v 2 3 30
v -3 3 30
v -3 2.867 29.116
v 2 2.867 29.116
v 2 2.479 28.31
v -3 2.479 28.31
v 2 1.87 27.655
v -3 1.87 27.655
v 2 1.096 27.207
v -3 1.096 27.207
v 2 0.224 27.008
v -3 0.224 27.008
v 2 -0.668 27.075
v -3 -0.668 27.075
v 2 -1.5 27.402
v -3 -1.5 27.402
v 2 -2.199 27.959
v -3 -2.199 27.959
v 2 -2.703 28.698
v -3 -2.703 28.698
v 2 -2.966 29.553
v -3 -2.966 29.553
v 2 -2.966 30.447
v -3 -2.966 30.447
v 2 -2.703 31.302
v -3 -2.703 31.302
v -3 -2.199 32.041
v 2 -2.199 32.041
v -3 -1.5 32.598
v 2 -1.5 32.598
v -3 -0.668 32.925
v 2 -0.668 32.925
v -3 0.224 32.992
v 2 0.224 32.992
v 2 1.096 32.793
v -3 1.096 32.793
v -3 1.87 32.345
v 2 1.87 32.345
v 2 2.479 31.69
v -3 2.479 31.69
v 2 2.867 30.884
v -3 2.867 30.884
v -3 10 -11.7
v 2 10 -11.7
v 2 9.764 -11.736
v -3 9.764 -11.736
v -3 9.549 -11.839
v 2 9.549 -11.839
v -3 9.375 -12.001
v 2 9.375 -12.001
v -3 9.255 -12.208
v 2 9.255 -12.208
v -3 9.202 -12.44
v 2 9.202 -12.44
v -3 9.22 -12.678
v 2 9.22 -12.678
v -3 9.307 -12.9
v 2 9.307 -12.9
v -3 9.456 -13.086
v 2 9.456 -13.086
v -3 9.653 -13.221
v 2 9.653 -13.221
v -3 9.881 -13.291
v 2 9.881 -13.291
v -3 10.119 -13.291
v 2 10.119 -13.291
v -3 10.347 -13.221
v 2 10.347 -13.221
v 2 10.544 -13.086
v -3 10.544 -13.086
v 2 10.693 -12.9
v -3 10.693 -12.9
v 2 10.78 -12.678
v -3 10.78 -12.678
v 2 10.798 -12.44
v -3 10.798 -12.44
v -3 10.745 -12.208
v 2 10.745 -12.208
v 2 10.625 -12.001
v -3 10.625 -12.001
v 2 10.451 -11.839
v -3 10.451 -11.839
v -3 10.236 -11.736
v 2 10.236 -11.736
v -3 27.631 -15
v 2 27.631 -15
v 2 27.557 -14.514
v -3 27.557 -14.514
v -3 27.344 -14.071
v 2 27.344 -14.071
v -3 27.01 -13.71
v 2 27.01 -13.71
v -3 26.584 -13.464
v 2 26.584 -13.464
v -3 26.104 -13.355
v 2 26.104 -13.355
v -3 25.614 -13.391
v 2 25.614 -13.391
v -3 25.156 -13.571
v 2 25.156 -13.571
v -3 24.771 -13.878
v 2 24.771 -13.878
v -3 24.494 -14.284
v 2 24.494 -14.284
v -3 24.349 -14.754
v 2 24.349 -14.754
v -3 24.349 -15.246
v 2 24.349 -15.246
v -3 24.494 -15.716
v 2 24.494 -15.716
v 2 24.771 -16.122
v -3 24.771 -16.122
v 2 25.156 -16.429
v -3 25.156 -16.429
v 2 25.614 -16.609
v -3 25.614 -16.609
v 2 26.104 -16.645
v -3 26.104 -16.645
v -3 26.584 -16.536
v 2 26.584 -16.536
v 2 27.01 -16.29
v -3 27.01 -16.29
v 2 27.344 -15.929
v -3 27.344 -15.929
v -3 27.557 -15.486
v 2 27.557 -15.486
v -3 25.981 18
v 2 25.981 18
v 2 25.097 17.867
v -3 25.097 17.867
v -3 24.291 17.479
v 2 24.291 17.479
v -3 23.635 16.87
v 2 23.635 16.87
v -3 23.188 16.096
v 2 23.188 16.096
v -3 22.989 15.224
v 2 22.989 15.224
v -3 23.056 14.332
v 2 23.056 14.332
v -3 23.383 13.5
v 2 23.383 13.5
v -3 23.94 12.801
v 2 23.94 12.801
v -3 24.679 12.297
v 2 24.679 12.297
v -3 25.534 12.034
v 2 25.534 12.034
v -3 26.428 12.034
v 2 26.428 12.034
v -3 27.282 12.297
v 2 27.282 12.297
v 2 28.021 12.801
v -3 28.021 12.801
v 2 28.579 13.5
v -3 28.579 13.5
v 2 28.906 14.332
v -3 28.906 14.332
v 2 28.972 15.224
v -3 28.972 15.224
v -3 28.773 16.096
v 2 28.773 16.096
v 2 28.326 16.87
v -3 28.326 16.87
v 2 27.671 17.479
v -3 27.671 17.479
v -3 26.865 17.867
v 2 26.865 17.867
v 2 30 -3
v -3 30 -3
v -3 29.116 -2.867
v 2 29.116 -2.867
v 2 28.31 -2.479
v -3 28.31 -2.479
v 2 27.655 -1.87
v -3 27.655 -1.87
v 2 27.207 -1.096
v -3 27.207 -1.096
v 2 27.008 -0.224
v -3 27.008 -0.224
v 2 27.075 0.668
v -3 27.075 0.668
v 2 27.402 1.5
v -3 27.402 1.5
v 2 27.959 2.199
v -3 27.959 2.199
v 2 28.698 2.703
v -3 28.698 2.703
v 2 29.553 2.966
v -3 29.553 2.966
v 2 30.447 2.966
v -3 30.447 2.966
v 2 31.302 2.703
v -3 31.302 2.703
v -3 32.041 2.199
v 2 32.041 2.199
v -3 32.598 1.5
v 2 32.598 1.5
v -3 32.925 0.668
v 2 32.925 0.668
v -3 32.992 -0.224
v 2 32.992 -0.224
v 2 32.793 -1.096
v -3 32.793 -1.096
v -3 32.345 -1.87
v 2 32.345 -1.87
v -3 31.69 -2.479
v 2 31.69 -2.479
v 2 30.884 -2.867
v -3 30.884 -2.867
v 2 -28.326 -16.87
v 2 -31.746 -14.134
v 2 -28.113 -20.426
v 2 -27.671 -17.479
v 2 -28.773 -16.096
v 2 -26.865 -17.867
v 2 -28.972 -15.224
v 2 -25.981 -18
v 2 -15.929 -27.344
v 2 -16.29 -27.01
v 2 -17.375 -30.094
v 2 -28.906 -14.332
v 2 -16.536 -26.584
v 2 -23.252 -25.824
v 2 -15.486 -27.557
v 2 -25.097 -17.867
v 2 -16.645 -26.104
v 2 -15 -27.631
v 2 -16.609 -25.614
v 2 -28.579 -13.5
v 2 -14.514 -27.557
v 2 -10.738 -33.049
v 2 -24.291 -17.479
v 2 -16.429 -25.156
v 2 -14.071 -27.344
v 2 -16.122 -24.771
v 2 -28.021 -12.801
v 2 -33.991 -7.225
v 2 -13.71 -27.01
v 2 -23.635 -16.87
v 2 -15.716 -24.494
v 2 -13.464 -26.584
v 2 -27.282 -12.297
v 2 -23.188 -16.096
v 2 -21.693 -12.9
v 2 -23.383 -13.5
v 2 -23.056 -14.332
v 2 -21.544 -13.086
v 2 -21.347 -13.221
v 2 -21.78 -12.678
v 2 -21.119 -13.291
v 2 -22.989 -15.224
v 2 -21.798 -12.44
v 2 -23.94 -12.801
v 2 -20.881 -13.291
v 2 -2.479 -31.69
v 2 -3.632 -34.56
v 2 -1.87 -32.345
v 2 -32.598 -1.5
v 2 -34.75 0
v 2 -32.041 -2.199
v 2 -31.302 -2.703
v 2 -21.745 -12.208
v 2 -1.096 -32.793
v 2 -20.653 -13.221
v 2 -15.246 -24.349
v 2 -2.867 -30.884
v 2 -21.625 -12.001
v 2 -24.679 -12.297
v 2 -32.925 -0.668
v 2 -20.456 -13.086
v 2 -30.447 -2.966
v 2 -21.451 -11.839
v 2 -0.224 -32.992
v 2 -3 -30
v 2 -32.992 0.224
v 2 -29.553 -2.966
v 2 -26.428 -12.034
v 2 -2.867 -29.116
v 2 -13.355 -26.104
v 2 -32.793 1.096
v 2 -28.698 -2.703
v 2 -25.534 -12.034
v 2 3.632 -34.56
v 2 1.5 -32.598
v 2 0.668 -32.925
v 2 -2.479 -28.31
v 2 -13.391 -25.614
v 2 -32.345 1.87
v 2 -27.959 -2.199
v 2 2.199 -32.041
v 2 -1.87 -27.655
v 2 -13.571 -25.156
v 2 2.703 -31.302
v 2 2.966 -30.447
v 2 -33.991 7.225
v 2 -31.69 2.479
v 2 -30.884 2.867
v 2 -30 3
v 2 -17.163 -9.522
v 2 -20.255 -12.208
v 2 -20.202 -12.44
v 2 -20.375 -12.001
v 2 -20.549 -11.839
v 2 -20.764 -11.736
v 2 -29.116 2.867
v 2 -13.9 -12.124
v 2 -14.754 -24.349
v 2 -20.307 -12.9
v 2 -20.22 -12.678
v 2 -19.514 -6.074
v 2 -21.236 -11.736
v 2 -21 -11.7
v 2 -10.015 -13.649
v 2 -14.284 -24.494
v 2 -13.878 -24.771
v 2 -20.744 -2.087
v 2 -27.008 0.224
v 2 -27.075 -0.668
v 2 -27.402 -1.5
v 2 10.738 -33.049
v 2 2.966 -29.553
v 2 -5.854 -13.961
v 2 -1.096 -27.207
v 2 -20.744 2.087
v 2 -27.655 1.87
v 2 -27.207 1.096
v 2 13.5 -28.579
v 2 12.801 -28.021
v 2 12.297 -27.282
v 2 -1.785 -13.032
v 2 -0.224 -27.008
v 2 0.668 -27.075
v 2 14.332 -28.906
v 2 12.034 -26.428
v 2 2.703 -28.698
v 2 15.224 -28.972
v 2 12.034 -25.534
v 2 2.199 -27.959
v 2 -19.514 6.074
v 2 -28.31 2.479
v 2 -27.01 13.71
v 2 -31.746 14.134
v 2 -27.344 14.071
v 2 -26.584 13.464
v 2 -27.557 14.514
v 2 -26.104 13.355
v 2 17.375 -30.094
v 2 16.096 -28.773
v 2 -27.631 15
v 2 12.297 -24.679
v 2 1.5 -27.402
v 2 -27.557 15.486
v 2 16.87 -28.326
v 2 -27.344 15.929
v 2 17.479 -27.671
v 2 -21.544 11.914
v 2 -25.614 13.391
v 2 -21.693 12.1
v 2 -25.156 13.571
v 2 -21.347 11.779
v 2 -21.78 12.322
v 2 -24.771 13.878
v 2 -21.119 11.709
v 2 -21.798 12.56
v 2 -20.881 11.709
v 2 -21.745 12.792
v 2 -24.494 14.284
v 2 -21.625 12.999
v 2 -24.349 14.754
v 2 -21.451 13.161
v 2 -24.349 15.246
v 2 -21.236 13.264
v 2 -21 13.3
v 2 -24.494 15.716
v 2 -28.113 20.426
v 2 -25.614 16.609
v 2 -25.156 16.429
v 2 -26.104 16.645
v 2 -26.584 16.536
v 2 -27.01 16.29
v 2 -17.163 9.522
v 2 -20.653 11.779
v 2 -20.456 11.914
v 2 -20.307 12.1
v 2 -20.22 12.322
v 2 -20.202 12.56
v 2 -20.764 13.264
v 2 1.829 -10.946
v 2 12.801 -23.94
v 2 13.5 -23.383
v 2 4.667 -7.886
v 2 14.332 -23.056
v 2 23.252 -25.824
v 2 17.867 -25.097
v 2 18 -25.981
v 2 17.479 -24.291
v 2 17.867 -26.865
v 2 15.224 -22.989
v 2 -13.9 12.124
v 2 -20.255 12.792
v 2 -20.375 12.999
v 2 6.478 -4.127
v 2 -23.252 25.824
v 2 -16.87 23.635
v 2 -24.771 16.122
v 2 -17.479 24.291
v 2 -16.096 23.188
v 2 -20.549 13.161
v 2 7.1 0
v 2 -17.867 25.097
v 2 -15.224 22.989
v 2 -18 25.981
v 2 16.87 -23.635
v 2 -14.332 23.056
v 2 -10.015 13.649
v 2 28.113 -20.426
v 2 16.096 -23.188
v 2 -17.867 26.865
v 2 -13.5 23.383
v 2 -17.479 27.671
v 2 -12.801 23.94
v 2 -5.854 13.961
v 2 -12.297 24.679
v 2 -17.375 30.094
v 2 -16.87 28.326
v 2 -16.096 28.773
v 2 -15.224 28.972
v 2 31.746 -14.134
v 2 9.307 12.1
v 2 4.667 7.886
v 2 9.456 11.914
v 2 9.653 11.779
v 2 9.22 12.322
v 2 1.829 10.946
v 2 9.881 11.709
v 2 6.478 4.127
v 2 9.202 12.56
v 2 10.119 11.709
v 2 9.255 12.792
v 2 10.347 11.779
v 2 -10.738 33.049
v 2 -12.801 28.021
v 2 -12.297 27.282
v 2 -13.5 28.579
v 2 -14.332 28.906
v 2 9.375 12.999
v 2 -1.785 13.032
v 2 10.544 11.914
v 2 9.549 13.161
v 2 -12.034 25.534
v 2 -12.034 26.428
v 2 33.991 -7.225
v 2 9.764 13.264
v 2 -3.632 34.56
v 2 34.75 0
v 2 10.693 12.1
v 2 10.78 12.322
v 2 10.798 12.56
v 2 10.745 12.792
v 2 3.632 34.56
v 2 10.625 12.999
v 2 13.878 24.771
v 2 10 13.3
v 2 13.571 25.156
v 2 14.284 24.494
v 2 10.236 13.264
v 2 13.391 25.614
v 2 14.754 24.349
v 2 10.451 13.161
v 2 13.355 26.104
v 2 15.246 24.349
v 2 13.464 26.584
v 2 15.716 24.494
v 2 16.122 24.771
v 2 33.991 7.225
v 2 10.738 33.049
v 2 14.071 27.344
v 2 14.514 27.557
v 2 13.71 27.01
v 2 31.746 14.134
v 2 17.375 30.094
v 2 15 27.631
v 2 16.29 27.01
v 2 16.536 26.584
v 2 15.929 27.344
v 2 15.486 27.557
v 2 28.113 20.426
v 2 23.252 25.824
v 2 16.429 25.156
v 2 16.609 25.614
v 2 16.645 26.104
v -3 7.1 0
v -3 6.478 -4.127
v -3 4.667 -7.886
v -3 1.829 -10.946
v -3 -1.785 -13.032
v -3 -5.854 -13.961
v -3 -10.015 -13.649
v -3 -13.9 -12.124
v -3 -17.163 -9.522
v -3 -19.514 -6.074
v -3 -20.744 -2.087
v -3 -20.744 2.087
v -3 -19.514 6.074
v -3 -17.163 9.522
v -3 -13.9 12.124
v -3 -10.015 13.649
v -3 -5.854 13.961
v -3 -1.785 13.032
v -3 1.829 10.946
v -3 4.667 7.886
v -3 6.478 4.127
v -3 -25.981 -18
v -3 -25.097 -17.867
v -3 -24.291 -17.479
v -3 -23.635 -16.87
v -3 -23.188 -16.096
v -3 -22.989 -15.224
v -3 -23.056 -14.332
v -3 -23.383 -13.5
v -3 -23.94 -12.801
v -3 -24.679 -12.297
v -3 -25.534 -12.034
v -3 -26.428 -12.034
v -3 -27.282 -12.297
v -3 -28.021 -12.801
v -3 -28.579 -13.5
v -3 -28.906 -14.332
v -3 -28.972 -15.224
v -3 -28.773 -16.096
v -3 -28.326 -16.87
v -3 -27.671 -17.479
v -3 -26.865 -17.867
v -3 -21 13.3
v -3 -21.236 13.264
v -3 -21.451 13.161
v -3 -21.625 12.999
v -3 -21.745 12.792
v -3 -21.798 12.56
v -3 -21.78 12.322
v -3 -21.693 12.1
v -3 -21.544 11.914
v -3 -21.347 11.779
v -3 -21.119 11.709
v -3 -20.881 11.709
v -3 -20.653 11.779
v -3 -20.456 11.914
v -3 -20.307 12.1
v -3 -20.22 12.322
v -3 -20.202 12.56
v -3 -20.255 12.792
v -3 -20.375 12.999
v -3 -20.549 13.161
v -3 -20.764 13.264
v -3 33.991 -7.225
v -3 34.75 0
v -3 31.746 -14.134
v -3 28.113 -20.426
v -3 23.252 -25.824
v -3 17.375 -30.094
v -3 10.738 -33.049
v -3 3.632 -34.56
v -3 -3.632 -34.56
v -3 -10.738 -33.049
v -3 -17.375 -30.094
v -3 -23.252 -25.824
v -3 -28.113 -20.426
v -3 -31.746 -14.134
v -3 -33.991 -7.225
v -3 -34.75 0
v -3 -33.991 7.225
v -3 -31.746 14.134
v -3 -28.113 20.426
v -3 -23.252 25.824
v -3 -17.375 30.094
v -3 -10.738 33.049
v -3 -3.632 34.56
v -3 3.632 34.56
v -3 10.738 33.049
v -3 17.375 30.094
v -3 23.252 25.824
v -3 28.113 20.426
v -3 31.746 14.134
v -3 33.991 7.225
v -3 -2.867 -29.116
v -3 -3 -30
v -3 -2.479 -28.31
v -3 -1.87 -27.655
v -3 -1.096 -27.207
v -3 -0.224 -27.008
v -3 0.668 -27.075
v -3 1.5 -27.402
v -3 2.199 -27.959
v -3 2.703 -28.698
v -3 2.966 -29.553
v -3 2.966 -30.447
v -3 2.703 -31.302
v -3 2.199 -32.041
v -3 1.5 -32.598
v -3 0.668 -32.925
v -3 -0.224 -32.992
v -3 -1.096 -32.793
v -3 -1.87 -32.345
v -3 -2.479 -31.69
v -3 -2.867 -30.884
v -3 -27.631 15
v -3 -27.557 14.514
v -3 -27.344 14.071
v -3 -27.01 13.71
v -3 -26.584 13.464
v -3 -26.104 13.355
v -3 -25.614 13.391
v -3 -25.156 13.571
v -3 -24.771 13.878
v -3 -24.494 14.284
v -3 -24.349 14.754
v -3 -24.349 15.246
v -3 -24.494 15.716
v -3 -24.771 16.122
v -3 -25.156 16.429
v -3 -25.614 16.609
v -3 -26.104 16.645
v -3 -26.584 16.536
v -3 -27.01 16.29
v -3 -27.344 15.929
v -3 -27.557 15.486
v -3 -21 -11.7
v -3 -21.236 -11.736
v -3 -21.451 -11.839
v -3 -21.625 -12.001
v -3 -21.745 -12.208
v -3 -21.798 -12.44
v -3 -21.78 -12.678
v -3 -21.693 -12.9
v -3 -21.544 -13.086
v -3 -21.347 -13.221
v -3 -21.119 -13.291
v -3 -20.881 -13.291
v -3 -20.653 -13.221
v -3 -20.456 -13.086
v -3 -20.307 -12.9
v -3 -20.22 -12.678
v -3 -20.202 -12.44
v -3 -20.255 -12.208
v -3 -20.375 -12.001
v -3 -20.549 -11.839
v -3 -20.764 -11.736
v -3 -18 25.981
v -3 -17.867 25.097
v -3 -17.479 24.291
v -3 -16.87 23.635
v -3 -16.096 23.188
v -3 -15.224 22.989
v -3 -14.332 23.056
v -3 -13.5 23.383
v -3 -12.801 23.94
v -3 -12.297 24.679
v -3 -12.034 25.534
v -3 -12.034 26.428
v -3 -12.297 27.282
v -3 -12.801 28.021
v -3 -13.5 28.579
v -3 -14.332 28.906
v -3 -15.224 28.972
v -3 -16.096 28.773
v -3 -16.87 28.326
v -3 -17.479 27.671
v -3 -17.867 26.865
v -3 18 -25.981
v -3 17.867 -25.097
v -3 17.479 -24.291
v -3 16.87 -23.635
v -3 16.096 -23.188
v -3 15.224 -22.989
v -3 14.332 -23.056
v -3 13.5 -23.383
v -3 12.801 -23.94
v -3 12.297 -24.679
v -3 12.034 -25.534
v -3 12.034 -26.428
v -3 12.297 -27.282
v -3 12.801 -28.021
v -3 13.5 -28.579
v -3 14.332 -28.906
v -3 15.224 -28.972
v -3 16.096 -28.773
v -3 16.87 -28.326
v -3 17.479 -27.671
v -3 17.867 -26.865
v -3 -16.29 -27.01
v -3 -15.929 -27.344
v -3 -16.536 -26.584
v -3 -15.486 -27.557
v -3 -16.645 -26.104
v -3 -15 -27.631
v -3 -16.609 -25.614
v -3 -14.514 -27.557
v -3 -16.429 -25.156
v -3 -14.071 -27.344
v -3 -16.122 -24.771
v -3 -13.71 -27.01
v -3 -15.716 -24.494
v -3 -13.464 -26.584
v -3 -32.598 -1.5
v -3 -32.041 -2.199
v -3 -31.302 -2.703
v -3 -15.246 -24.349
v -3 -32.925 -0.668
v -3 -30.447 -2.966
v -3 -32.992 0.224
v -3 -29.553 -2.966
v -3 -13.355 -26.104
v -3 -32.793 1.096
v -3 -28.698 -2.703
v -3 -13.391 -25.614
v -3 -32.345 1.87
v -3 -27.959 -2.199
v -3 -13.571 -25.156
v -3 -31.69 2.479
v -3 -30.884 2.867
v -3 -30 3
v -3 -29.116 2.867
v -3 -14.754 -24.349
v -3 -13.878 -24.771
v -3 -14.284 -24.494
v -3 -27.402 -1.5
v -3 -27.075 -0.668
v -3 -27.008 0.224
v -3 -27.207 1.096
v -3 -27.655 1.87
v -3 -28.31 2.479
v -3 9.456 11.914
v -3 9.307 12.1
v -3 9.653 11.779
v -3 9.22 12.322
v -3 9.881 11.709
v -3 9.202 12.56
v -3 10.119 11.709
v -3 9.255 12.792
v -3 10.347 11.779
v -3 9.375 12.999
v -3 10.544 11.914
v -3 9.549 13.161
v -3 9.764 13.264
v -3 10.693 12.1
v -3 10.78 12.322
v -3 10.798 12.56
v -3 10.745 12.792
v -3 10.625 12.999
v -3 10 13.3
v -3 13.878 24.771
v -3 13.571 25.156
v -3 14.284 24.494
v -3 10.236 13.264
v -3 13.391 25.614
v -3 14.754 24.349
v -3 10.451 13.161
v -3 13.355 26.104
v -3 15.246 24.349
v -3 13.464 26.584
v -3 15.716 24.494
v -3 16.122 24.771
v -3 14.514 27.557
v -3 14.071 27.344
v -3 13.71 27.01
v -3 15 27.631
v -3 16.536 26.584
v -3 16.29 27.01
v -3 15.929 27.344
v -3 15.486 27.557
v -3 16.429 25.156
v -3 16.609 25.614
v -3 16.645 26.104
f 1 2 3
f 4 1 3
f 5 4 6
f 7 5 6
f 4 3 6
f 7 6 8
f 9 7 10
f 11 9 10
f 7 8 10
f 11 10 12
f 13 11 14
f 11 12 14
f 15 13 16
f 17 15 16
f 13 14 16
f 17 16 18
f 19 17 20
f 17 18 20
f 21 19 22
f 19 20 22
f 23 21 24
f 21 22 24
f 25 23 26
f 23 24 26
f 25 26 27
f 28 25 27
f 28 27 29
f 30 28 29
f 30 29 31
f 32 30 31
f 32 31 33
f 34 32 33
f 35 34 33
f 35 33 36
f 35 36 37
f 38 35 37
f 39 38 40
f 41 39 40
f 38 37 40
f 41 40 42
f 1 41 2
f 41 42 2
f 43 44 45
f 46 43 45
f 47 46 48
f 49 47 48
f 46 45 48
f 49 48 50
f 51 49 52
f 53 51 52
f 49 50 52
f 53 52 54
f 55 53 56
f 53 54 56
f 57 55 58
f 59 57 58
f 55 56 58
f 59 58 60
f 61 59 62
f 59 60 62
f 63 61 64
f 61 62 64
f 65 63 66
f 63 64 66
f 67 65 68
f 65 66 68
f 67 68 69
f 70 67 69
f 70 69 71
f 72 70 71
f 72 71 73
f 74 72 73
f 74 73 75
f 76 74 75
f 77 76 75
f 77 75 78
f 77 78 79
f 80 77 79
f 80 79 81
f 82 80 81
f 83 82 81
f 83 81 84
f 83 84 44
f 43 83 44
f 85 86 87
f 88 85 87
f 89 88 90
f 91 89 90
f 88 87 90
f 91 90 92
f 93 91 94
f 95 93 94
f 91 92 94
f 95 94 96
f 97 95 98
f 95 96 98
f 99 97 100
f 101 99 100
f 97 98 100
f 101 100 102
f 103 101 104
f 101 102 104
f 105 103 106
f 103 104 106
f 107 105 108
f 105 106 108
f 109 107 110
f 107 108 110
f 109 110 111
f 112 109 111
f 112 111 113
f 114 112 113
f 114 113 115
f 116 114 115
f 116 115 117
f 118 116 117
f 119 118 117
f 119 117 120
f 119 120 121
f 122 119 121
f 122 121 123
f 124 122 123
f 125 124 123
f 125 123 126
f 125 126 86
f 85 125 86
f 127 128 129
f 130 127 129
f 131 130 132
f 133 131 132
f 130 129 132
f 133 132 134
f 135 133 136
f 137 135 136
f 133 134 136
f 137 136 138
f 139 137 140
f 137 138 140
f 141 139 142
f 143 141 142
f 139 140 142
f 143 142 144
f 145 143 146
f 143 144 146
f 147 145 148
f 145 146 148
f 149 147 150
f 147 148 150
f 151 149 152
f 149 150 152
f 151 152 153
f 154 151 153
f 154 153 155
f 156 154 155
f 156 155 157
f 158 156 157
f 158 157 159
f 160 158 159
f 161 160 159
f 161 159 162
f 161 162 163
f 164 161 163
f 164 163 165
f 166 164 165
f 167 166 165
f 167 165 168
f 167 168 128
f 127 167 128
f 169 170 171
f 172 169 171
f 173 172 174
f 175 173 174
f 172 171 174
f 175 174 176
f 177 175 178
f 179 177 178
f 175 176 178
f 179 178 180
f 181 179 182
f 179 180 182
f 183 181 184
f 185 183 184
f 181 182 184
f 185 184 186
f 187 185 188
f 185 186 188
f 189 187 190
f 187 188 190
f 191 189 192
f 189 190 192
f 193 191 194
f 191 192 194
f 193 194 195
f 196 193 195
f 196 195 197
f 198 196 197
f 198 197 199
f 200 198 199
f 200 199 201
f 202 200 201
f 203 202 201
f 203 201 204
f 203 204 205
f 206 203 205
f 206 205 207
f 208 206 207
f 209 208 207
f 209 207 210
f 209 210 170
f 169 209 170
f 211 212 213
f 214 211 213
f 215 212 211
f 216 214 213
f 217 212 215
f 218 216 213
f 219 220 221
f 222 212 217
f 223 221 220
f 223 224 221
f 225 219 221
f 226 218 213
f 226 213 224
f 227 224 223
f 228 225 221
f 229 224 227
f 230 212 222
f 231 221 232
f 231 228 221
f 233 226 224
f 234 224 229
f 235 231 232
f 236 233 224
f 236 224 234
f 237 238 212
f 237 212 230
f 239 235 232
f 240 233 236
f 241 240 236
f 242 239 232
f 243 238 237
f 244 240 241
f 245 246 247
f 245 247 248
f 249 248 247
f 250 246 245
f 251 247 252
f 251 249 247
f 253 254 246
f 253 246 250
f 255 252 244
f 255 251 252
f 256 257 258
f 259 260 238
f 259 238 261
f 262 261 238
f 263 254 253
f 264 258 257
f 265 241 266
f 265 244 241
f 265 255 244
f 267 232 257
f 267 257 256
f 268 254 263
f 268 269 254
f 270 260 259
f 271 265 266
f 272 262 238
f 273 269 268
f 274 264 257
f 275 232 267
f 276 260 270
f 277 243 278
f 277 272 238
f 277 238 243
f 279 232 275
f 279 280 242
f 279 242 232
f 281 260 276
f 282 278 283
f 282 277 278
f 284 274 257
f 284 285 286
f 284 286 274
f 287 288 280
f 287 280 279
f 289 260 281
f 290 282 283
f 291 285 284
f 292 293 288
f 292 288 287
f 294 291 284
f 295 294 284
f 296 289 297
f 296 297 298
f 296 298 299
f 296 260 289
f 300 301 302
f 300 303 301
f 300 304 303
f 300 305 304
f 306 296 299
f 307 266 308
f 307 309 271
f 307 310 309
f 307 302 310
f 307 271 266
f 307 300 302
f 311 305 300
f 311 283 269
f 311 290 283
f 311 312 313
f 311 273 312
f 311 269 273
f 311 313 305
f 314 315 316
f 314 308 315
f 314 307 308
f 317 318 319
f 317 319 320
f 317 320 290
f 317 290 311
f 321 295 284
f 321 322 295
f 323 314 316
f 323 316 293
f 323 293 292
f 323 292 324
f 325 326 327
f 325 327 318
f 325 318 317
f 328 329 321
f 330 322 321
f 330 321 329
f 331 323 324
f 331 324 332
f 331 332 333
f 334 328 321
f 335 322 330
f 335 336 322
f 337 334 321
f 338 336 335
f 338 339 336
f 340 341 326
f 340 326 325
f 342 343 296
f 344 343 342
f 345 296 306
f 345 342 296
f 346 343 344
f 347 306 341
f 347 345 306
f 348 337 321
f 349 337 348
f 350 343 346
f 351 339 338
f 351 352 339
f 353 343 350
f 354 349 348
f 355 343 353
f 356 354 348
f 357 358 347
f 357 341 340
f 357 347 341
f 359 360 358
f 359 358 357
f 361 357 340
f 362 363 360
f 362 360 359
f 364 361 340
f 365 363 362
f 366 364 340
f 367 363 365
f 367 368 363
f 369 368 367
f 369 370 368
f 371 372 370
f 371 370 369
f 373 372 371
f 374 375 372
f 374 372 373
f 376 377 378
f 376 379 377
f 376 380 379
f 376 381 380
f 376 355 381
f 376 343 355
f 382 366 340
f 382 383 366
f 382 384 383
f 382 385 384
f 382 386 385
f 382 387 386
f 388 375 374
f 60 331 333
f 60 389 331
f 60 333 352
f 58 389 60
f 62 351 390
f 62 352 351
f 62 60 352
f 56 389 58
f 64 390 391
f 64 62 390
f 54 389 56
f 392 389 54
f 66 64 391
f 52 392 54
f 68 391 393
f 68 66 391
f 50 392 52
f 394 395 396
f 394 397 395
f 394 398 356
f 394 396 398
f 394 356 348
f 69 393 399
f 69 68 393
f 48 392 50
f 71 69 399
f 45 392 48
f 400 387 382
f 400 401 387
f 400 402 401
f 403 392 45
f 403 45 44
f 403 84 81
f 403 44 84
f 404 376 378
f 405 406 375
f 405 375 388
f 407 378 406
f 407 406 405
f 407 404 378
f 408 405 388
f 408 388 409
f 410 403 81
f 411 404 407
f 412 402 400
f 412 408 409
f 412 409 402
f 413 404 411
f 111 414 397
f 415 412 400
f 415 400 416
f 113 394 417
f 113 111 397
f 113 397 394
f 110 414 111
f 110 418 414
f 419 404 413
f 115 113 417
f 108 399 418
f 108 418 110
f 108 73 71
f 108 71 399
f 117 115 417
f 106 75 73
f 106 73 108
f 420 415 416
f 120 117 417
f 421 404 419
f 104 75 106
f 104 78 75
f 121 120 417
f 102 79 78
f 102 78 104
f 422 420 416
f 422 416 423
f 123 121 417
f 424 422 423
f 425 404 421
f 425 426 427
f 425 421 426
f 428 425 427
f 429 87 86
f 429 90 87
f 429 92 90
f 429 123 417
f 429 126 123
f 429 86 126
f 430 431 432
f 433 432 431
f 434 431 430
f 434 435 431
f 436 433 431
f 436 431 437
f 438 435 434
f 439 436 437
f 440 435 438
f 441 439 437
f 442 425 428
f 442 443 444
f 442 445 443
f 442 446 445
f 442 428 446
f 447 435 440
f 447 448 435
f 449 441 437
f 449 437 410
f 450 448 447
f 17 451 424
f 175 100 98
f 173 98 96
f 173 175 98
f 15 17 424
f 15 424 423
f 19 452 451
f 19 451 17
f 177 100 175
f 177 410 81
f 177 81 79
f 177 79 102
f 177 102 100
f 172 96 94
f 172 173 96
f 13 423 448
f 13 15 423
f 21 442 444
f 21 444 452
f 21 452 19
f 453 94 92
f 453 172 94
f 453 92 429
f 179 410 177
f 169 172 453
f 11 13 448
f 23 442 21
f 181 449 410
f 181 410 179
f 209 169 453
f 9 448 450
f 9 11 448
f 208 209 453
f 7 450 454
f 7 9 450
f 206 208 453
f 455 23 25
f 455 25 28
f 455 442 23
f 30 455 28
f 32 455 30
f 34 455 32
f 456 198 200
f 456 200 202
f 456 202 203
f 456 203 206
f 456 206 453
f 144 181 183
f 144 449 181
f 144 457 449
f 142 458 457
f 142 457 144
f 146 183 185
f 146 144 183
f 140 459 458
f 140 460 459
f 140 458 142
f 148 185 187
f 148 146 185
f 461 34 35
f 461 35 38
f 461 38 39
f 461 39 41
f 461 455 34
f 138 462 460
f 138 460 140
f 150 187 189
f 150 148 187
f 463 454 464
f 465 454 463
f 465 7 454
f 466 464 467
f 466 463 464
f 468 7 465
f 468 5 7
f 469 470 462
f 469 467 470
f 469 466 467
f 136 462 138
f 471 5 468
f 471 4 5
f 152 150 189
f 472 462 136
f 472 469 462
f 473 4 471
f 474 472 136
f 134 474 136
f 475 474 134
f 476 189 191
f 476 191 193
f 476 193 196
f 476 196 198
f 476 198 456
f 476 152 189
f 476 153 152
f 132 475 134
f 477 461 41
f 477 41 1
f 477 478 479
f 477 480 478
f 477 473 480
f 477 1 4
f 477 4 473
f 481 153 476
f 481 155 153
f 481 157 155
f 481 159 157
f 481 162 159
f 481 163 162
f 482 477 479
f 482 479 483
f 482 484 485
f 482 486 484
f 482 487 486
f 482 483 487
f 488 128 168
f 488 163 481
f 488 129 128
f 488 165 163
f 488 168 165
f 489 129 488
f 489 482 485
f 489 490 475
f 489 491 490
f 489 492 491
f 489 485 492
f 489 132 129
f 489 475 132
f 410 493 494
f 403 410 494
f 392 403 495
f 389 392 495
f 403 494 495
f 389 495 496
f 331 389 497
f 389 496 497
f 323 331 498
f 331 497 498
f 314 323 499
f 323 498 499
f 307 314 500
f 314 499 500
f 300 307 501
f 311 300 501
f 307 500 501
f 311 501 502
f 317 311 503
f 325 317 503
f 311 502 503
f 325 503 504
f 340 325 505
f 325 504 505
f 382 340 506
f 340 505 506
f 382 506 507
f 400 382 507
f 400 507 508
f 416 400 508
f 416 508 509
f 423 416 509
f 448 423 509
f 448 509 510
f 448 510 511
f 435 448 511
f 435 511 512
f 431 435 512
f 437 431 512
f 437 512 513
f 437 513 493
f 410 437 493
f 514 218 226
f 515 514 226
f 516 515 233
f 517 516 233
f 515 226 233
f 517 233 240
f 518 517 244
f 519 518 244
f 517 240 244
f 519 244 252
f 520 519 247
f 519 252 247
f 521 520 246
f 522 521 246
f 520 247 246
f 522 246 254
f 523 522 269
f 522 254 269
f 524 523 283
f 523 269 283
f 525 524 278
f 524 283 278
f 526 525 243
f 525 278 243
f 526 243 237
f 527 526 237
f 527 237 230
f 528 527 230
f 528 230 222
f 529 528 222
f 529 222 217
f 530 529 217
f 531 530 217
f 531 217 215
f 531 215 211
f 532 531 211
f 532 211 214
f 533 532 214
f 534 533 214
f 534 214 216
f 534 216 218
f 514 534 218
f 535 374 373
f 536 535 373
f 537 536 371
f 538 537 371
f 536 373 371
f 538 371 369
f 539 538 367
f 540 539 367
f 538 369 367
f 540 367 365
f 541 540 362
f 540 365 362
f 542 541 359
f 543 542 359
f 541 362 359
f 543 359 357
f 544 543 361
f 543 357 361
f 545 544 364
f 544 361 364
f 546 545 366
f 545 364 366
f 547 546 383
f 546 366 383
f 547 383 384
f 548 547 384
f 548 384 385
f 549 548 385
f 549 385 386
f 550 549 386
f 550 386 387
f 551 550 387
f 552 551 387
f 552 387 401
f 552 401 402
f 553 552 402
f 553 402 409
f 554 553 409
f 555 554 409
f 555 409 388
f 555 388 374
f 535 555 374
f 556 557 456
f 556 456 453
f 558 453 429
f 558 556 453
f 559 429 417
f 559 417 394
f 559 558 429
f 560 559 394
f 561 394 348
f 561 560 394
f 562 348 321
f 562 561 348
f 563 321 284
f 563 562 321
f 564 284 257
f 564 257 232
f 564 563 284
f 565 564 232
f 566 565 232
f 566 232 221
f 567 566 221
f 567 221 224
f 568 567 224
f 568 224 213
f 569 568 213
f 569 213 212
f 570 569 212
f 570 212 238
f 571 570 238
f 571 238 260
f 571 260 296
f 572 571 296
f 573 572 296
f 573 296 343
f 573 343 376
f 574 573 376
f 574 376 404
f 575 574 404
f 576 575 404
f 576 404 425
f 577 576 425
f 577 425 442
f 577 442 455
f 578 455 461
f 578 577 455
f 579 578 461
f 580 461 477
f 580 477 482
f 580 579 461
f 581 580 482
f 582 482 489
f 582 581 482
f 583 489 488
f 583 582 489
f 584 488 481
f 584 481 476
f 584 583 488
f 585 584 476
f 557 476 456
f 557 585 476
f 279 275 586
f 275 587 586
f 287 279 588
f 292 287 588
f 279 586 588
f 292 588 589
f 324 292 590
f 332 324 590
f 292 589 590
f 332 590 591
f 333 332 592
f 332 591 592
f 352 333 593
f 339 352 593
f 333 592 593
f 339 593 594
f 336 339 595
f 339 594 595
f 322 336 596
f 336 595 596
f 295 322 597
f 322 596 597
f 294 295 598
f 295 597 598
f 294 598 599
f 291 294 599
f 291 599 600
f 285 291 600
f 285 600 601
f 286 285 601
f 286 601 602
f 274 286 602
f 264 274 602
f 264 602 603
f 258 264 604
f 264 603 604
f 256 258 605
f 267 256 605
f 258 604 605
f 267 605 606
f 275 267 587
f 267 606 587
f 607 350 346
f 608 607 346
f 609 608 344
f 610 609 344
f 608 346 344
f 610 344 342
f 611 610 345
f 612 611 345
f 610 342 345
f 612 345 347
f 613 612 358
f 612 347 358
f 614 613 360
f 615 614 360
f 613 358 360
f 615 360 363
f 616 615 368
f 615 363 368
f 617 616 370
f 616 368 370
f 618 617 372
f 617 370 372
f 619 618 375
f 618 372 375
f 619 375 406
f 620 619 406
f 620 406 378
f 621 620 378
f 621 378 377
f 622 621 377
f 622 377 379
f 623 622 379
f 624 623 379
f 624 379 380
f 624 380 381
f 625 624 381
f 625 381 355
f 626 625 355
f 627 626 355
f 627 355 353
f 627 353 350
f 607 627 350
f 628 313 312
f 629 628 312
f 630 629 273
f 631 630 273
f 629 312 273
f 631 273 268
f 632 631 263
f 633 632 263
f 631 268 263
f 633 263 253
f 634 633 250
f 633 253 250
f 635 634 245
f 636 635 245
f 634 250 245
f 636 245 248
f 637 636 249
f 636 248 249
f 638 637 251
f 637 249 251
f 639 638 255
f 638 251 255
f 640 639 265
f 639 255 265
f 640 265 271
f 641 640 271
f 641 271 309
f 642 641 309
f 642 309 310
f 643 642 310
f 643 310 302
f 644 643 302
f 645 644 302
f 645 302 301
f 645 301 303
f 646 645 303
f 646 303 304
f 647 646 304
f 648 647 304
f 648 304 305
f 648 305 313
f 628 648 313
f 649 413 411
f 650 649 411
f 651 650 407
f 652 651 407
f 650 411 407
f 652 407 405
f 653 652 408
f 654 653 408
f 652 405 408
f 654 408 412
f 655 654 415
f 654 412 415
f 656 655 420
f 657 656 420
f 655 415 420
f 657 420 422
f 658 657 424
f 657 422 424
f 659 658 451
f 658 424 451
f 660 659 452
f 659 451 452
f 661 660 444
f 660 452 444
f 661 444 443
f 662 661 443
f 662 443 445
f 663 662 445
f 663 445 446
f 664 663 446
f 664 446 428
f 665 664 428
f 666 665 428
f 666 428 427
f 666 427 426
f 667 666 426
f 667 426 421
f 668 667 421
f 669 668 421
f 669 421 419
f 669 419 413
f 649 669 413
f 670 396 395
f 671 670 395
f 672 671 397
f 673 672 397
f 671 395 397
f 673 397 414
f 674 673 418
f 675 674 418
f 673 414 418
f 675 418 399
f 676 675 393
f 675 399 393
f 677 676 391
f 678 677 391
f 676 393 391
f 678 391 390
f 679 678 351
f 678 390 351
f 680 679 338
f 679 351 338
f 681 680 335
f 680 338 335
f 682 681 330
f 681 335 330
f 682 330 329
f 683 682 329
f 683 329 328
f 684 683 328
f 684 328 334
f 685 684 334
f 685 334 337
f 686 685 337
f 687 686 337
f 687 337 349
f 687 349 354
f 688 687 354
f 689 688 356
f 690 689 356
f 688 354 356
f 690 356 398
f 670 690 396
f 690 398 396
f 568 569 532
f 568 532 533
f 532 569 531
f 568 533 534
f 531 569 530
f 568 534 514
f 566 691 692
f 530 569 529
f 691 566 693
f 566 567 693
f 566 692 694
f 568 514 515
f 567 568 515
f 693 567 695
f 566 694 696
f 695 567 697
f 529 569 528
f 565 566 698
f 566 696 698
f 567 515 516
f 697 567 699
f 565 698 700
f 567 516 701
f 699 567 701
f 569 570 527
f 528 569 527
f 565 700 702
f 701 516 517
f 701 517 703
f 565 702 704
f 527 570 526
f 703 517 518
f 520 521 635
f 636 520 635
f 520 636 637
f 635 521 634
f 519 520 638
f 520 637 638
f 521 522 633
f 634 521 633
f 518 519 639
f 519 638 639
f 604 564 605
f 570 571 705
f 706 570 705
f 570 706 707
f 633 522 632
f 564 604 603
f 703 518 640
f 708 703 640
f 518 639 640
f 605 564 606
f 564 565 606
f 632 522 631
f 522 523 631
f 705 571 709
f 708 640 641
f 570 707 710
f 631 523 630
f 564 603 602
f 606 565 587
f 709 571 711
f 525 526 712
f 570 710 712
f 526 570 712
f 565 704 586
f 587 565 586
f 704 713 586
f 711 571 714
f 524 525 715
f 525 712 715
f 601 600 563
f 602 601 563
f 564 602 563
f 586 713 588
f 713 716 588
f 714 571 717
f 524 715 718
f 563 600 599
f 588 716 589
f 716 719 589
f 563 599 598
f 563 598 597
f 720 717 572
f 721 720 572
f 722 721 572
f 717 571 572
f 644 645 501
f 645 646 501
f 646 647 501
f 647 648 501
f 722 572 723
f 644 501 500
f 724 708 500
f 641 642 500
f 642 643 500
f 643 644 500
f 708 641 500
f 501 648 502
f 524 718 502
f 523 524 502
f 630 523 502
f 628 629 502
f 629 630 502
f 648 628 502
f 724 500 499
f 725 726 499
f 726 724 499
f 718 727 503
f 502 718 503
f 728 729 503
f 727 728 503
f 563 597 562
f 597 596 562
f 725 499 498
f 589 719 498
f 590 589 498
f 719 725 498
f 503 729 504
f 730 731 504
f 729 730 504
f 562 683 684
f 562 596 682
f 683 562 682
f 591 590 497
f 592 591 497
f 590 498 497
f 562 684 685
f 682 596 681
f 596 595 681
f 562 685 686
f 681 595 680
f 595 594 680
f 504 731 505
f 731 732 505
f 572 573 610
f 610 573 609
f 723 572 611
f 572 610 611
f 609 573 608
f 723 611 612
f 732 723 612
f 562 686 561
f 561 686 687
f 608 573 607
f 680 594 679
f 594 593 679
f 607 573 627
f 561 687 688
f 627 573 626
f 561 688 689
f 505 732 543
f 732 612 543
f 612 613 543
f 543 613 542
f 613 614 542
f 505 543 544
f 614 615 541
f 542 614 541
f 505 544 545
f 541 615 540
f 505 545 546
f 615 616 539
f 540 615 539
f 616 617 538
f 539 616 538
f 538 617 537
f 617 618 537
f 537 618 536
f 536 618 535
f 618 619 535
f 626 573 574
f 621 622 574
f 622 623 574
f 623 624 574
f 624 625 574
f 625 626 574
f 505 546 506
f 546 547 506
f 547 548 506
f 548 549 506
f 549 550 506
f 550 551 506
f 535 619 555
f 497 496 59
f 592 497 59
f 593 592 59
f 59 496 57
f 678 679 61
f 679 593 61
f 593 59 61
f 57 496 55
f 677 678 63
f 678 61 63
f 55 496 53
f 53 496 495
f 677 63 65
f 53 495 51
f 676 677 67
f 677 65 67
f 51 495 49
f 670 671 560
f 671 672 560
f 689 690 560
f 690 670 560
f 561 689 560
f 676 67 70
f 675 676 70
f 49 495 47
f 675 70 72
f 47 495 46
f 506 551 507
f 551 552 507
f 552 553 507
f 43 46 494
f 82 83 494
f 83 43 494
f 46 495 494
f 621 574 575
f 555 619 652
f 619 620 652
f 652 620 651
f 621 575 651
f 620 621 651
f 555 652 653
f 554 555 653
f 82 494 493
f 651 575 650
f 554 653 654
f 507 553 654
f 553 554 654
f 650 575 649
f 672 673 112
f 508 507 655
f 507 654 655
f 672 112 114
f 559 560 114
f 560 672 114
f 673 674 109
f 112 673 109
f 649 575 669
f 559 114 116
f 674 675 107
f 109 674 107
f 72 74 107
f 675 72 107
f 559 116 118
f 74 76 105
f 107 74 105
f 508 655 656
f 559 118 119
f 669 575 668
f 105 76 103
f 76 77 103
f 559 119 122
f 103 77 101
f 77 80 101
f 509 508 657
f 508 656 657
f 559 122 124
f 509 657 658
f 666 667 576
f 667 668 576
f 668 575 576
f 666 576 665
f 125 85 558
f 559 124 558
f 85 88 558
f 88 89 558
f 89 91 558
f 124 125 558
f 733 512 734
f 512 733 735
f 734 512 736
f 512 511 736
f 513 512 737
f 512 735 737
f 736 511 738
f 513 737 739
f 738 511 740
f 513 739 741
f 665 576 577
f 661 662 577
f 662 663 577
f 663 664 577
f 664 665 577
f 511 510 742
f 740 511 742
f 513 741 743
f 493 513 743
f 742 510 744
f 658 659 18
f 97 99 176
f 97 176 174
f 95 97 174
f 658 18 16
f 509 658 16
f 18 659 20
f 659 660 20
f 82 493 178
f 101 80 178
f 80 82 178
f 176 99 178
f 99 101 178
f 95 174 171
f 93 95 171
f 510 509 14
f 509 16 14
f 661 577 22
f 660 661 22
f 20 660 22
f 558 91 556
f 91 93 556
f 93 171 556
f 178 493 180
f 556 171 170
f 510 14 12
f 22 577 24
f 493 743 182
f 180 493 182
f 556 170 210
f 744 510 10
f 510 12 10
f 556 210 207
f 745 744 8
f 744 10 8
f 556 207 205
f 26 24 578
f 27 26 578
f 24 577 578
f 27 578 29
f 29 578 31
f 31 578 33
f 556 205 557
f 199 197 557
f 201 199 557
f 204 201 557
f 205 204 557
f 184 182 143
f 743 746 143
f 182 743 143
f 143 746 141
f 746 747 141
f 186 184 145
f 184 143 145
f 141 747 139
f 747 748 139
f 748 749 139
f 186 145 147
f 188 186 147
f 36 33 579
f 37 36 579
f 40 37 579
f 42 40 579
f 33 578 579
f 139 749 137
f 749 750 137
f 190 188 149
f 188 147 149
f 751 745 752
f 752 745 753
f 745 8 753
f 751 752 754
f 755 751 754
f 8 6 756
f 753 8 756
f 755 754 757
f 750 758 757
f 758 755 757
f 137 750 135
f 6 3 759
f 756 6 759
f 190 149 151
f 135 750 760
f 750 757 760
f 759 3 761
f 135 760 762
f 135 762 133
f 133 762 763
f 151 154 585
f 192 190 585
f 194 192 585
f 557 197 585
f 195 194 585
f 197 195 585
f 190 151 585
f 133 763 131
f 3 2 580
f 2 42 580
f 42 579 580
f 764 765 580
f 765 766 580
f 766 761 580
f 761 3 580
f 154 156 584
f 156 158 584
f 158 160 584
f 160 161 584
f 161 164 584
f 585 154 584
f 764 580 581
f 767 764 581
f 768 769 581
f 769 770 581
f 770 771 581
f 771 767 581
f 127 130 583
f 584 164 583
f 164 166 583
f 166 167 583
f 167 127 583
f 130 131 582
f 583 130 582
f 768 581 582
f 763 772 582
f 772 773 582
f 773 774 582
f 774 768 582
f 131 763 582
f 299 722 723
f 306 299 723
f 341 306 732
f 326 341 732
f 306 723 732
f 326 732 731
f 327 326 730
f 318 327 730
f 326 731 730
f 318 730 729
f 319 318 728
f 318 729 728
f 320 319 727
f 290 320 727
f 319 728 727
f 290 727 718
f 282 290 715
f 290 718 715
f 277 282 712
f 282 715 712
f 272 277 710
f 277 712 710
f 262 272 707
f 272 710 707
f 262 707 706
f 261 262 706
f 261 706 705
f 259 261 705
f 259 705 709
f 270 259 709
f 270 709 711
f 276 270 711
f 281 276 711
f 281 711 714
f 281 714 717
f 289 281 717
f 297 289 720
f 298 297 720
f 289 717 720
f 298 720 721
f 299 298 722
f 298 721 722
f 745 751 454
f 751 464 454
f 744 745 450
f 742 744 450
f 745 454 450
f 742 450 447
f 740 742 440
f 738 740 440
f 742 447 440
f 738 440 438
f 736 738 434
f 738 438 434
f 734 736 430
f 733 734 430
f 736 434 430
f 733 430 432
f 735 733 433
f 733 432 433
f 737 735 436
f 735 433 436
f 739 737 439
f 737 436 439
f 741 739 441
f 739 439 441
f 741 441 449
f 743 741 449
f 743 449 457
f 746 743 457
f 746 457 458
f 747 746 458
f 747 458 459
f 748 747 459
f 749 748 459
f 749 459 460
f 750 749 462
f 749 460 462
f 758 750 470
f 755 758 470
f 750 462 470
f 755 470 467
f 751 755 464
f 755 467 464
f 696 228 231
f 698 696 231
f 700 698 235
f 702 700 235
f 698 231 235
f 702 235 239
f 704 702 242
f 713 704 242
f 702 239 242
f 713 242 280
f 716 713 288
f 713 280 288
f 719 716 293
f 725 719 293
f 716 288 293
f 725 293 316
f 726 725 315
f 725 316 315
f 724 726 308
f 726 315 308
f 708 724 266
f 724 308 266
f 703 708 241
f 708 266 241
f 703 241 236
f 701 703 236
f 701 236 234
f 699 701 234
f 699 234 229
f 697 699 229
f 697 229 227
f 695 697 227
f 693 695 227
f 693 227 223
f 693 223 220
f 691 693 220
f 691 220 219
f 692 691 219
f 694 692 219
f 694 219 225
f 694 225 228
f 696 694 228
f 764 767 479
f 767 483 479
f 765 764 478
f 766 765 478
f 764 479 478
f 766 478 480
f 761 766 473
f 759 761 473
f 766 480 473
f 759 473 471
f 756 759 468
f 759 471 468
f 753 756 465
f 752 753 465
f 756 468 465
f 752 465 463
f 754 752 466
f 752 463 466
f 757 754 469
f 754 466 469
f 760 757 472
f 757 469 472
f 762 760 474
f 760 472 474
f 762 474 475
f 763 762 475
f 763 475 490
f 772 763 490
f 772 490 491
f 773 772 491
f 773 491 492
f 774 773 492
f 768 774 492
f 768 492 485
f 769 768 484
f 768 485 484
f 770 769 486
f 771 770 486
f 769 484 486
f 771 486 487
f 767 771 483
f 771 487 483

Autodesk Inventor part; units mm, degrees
ref_plane "YZ Plane" through (0, 0, 0) normal (1, 0, 0) x (0, 1, 0)
ref_plane "XZ Plane" through (0, 0, 0) normal (0, 1, 0) x (-1, 0, 0)
ref_plane "XY Plane" through (0, 0, 0) normal (0, 0, 1) x (1, 0, 0)
sketch "Sketch1" plane through (0, 0, 0) normal (1, 0, 0) x (0, 1, 0)
  circle A0 centre (0, 0) radius 34.75
  circle A1 centre (-6.9, 0) radius 14
  dimension "d0" = 69.5
  dimension "d1" = 28
  dimension "d2" = 6.9
extrude "Extrusion1" add sketch "Sketch1" along normal blind 2
sketch "Sketch2" plane through (0, 0, 0) normal (-1, 0, 0) x (0, 0, 1)
  circle A0 centre (0, 0) radius 30
  line L0 (0, 0) -> (25.9808, 15)
  line L1 (0, 0) -> (30, 0) construction
  dimension "d5" = 60
  dimension "d6" = 30
hole "Hole1" at (0, 15, 25.9808) direction (1, 0, 0) diameter 3.3 depth 5
pattern_circular "Circular Pattern1" count 4 over 360 about axis through (0, 0, 0) along (1, 0, 0) of "Hole1"
thread "Thread1" size "M4x0.7" class "6H" standard "ANSI Metric M Profile" full length
thread "Thread2" size "M4x0.7" class "6H" standard "ANSI Metric M Profile" full length
thread "Thread3" size "M4x0.7" class "6H" standard "ANSI Metric M Profile" full length
thread "Thread4" size "M4x0.7" class "6H" standard "ANSI Metric M Profile" full length
sketch "Sketch3" plane through (2, 0, 0) normal (1, 0, 0) x (0, 0, -1)
  circle A0 centre (0, 0) radius 30
  point P0 (0, 30)
  dimension "d25" = 60
hole "Hole2" at (2, 30, 0) direction (-1, 0, 0) diameter 6 depth 5
pattern_circular "Circular Pattern2" count 4 over 360 about axis through (0, 0, 0) along (1, 0, 0) of "Hole2"
sketch "Sketch4" plane through (0, 0, 0) normal (-1, 0, 0) x (0, 0, 1)
  circle A0 centre (0, 0) radius 30
  line L0 (0, 0) -> (15, 25.9808)
  line L1 (0, 0) -> (30, 0) construction
  point P0 (15, 25.9808)
  dimension "d36" = 60
  dimension "d37" = 60
hole "Hole3" at (0, 25.9808, 15) direction (1, 0, 0) diameter 6 depth 5
pattern_circular "Circular Pattern3" count 4 over 360 about axis through (0, 0, 0) along (1, 0, 0) of "Hole3"
thicken "Thicken1" operation add thickness 3 both sides no extend neighbours yes toward (-1, 0, 0) faces at (0, 19.5446, -6.1067)
sketch "Sketch5" plane through (-3, 0, 0) normal (-1, 0, 0) x (0, 0, 1)
  line L0 (-12.5, 10) -> (12.5, 10)
  line L1 (12.5, 10) -> (12.5, -21)
  line L2 (12.5, -21) -> (-12.5, -21)
  line L3 (-12.5, -21) -> (-12.5, 10)
  point P0 (0, 0)
  point P1 (0, 10)
  dimension "d50" = 25
  dimension "d51" = 10
  dimension "d52" = 31
hole "Hole4" at (-3, 10, -12.5) at (-3, 10, 12.5) at (-3, -21, 12.5) at (-3, -21, -12.5) direction (1, 0, 0) diameter 1.6 depth 5
thread "Thread5" size "M2x0.4" class "6H" standard "ANSI Metric M Profile" full length
thread "Thread6" size "M2x0.4" class "6H" standard "ANSI Metric M Profile" full length
thread "Thread7" size "M2x0.4" class "6H" standard "ANSI Metric M Profile" full length
thread "Thread8" size "M2x0.4" class "6H" standard "ANSI Metric M Profile" full length
properties part number "sample-transfer_adapter-plate"
